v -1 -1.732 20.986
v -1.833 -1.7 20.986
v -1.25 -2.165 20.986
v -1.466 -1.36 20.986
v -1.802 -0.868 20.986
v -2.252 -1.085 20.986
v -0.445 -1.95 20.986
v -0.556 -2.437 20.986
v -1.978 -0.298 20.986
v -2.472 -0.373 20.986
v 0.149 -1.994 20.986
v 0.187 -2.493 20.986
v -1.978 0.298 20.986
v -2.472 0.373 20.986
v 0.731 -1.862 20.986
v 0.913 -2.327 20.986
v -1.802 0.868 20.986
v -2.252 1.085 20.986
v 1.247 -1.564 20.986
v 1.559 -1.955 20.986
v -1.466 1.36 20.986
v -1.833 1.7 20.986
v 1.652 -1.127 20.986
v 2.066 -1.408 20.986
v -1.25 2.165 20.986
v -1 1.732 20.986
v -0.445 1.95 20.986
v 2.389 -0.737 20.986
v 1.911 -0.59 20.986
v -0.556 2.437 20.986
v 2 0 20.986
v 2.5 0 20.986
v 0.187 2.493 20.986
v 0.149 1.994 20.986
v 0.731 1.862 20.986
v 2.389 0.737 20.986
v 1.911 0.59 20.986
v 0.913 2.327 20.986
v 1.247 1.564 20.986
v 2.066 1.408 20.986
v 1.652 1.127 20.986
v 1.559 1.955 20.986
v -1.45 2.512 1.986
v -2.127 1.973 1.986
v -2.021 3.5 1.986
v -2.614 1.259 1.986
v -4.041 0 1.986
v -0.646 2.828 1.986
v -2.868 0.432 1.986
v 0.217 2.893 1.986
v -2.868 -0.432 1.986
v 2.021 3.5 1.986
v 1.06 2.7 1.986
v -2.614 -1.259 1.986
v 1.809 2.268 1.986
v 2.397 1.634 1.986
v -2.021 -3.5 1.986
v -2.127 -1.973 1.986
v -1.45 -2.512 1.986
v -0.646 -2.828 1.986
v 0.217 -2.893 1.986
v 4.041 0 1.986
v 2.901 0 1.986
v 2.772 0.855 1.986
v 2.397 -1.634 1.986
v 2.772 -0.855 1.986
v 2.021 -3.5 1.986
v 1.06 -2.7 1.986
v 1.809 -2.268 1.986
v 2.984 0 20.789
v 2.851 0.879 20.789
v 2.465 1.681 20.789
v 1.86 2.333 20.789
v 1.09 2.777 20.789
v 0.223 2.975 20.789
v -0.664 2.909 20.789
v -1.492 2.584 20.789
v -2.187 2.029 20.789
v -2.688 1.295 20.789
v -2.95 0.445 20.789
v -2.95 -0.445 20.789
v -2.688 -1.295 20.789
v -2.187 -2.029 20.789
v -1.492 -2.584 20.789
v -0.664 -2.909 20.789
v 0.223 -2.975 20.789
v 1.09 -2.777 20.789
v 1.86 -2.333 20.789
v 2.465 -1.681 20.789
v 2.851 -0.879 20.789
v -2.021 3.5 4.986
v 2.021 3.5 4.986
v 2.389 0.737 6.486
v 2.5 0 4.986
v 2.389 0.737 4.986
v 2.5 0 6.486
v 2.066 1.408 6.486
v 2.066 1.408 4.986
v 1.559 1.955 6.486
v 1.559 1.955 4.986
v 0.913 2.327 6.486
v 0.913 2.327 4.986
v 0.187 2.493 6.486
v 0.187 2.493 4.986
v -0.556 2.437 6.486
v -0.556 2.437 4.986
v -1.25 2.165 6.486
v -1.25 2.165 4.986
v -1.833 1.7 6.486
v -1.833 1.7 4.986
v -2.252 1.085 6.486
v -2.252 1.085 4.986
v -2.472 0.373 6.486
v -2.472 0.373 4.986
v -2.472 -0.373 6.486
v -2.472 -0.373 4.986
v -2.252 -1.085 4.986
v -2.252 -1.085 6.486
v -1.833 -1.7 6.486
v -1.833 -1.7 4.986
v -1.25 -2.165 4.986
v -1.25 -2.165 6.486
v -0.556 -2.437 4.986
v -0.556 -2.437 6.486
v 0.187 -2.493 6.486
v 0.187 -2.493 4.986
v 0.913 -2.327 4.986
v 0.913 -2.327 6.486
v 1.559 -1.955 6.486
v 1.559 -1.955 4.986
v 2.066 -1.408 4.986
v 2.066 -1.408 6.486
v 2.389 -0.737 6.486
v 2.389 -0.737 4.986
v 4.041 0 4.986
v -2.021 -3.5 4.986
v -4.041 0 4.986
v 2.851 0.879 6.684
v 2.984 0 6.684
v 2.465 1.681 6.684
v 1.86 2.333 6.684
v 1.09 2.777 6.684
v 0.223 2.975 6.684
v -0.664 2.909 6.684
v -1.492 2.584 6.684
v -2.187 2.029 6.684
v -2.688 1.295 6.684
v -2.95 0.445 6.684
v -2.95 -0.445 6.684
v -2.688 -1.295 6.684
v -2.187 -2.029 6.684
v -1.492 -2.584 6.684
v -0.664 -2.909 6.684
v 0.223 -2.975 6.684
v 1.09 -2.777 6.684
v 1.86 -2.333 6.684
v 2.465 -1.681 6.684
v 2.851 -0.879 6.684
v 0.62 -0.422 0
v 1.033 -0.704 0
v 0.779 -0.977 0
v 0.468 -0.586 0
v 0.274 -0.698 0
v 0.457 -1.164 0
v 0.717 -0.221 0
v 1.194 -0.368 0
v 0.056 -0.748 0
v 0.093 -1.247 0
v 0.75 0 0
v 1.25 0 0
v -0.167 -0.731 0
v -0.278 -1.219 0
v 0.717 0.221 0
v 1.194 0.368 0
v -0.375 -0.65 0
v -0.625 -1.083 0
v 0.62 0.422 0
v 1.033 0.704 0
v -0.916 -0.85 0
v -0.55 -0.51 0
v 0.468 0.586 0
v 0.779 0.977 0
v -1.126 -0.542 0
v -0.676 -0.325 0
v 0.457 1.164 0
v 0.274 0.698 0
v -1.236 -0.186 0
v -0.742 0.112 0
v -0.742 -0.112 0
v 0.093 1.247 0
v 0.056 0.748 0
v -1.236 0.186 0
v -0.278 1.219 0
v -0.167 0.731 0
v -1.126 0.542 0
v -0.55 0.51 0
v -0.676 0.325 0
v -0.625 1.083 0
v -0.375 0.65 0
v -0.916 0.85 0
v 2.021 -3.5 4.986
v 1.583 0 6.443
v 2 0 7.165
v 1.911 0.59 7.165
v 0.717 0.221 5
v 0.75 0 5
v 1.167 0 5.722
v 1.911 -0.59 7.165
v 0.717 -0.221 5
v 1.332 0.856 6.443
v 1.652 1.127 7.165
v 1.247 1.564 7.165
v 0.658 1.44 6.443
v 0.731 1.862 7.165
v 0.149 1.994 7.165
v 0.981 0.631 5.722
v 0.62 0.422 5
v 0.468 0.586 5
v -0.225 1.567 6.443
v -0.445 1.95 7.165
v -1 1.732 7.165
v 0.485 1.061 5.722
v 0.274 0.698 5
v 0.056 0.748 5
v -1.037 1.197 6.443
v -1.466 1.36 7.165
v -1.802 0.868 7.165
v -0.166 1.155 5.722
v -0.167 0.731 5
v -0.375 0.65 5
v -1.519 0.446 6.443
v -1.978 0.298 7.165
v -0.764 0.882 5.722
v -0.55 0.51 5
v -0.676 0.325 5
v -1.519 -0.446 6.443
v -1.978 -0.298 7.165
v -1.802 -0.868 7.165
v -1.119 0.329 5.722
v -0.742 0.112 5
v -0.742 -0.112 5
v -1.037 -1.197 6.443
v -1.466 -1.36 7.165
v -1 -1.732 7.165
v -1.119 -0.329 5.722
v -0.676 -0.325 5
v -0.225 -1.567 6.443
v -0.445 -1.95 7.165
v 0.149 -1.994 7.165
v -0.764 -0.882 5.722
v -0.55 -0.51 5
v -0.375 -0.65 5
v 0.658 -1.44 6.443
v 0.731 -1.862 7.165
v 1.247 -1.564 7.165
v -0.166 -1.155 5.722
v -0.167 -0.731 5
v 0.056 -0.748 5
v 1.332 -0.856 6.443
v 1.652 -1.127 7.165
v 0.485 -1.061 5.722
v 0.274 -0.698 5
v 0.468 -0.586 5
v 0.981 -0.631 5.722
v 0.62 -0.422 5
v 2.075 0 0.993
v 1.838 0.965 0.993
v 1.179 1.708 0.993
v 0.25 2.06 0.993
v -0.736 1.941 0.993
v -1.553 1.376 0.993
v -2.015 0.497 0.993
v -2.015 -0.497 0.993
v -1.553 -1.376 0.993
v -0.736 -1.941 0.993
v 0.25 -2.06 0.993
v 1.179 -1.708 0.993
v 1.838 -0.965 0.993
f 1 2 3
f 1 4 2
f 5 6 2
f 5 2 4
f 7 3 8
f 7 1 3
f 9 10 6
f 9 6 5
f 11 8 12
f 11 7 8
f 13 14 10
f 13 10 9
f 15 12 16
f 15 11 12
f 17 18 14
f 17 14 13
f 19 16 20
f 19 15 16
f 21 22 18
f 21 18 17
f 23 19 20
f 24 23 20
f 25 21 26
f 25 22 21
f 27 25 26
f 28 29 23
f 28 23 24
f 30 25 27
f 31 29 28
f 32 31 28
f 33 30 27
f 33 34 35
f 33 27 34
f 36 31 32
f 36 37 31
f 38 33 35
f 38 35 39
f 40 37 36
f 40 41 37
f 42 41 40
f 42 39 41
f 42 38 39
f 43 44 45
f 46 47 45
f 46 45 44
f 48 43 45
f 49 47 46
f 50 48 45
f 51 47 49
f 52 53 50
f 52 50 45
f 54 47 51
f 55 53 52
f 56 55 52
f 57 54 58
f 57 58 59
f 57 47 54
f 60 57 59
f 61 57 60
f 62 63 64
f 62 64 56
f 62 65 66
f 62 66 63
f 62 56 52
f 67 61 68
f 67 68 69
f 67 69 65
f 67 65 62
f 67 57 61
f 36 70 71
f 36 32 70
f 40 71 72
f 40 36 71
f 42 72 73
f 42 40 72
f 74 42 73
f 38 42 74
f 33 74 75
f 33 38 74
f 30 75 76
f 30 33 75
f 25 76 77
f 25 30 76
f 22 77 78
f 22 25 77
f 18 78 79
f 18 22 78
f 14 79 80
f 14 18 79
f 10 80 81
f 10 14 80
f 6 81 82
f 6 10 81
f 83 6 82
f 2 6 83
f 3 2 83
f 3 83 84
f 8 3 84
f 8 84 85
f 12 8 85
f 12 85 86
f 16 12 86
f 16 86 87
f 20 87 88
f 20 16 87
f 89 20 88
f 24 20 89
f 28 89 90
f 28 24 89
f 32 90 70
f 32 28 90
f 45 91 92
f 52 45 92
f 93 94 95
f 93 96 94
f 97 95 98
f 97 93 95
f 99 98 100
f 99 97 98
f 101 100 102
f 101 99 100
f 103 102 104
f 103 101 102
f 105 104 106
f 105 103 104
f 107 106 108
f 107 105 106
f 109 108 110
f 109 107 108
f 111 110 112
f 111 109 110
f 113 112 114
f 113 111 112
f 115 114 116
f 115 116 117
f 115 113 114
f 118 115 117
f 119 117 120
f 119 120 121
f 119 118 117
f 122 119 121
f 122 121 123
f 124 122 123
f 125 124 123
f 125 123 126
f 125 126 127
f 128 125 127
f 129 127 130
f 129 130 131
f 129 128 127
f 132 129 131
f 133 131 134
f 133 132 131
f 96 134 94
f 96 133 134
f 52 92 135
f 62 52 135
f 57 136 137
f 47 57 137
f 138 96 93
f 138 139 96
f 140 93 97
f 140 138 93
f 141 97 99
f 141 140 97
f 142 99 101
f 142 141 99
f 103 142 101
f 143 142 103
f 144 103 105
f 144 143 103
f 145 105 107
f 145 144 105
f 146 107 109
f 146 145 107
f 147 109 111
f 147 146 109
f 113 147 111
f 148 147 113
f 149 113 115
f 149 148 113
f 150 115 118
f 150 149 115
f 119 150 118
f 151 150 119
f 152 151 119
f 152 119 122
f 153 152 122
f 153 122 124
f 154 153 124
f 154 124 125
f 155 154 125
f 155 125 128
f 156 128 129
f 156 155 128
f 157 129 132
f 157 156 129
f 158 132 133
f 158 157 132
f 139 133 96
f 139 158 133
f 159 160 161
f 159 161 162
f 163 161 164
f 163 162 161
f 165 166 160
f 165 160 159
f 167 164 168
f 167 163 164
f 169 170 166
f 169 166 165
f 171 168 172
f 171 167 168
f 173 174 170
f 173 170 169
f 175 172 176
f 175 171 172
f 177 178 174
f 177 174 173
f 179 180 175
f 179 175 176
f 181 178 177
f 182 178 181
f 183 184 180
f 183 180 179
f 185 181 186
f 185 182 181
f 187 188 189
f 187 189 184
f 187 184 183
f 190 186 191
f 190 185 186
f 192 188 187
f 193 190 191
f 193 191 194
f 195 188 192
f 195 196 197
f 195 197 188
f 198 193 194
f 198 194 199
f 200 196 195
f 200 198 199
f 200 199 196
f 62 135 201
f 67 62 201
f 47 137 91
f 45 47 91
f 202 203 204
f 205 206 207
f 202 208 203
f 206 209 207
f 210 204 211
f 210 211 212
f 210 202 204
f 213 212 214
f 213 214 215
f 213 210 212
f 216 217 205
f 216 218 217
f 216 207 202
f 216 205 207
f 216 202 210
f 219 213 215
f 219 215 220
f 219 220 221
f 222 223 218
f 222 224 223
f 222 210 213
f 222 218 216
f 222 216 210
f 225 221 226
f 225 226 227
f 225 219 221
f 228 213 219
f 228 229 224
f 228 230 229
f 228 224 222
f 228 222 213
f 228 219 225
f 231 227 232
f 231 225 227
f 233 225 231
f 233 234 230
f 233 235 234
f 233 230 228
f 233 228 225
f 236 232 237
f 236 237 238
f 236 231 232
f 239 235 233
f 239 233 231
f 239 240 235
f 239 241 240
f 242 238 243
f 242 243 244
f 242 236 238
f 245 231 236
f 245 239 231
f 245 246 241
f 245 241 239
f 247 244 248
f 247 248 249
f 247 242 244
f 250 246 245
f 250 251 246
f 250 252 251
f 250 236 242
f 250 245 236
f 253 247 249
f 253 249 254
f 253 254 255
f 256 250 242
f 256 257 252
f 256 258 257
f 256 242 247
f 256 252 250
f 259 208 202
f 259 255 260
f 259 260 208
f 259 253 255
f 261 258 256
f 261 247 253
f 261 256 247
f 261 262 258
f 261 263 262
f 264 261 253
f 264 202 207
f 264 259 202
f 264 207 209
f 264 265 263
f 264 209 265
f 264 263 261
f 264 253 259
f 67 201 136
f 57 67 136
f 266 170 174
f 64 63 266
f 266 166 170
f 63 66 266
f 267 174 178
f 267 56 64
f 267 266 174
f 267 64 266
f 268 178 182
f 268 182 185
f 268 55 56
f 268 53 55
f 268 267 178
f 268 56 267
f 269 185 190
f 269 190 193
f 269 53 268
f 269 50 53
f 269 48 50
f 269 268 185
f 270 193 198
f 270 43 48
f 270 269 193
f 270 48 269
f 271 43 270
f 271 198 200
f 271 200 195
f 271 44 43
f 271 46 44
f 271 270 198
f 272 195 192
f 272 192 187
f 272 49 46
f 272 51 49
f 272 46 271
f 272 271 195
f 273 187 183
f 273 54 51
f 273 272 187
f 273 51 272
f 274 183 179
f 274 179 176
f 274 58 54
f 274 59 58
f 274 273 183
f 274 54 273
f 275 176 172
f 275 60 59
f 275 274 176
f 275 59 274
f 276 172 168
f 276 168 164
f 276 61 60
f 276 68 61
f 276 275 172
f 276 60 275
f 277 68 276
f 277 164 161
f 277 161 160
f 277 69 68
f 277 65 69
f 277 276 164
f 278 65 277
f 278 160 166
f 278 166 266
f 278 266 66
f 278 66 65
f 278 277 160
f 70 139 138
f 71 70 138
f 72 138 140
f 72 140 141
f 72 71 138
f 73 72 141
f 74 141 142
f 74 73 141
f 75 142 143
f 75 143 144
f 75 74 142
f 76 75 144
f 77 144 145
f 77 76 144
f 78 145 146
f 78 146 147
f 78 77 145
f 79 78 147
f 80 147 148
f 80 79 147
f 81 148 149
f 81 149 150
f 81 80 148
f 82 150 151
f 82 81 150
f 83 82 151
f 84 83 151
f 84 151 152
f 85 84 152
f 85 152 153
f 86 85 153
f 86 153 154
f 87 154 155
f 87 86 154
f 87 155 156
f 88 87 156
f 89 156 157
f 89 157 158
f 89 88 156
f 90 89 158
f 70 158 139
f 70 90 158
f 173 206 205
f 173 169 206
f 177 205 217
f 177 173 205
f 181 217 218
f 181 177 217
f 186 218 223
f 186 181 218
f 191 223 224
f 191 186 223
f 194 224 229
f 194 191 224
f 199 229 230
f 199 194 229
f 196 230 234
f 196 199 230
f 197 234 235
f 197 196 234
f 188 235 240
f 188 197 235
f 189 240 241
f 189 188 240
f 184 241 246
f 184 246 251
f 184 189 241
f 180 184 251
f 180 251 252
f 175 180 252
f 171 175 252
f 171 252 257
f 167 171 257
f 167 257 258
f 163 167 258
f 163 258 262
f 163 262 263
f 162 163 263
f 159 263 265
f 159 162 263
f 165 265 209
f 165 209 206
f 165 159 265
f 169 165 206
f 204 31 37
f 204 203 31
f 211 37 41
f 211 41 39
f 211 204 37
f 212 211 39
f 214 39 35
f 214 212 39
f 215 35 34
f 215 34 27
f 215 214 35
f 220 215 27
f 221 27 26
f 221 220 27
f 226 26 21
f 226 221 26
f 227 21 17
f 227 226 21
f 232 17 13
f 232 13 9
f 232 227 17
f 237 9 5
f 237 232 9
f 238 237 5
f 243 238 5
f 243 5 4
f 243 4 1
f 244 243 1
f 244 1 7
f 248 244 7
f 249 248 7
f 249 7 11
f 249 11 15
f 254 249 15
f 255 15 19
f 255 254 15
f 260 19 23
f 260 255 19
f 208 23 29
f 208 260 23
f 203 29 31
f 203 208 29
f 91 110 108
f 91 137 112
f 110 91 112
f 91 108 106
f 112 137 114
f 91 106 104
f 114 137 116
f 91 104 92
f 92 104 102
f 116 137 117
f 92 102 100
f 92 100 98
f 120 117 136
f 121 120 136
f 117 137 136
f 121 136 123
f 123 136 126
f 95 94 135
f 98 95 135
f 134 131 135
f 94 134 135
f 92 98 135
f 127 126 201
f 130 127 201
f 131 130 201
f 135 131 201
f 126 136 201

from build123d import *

# Parameters (mm, degrees)
F0_W     = 1.2707259422
F0_H     = 3
F2_R     = 2.5
F2_R_2   = 2.0207259422
F3_DEPTH = 3


with BuildPart() as f1:
    # F0 (on Front) → F1 (revolve)
    with BuildSketch(Plane.XZ):
        Polygon((-21.4229148179, -4.8091755062), (-21.4229148179, -4.8227669001), (-20.1521888758, -4.8227669001), (-19.6729148179, -4.8227669001), (-19.6729148179, -3.3227669001), (-19.1892255098, -3.125249641), (-19.1892255098, 10.9797158409), (-19.6729148179, 11.1772330999), (-20.1729148179, 11.1772330999), (-20.1729148179, -2.6441119968), align=None)
        with Locations((-20.7875518468, -6.3227669001)):
            Rectangle(F0_W, F0_H)
        Polygon((-21.4229148179, -7.8227669001), (-21.4229148179, -9.8091755062), (-20.9229148179, -9.8091755062), (-19.2720282078, -7.8227669001), (-20.1521888758, -7.8227669001), align=None)
    revolve(axis=Axis((-22.1729148179, 0, 14.5059827045), (0, 0, 1)))

    # F2 (on face) → F3 (join, through all)
    with BuildSketch(Plane(origin=(0, 0, -4.8227669001), x_dir=(1, 0, 0), z_dir=(0, 0, -1))):
        Polygon((-20.1521888758, 3.5), (-24.1936407601, 3.5), (-26.2143667023, 0), (-24.1936407601, -3.5), (-20.1521888758, -3.5), (-18.1314629336, 0), align=None)
        with Locations((-22.1729148179, 0)):
            Circle(F2_R, mode=Mode.SUBTRACT)
        with Locations((-22.1729148179, 0)):
            Circle(F2_R)
        with Locations((-22.1729148179, 0)):
            Circle(F2_R_2, mode=Mode.SUBTRACT)
    extrude(amount=F3_DEPTH)


with BuildPart() as f1_1:
    # F4: moved
    add(f1.part.moved(Location((22.1729148179, 0, 9.8091755062))))


solid = f1_1.part
